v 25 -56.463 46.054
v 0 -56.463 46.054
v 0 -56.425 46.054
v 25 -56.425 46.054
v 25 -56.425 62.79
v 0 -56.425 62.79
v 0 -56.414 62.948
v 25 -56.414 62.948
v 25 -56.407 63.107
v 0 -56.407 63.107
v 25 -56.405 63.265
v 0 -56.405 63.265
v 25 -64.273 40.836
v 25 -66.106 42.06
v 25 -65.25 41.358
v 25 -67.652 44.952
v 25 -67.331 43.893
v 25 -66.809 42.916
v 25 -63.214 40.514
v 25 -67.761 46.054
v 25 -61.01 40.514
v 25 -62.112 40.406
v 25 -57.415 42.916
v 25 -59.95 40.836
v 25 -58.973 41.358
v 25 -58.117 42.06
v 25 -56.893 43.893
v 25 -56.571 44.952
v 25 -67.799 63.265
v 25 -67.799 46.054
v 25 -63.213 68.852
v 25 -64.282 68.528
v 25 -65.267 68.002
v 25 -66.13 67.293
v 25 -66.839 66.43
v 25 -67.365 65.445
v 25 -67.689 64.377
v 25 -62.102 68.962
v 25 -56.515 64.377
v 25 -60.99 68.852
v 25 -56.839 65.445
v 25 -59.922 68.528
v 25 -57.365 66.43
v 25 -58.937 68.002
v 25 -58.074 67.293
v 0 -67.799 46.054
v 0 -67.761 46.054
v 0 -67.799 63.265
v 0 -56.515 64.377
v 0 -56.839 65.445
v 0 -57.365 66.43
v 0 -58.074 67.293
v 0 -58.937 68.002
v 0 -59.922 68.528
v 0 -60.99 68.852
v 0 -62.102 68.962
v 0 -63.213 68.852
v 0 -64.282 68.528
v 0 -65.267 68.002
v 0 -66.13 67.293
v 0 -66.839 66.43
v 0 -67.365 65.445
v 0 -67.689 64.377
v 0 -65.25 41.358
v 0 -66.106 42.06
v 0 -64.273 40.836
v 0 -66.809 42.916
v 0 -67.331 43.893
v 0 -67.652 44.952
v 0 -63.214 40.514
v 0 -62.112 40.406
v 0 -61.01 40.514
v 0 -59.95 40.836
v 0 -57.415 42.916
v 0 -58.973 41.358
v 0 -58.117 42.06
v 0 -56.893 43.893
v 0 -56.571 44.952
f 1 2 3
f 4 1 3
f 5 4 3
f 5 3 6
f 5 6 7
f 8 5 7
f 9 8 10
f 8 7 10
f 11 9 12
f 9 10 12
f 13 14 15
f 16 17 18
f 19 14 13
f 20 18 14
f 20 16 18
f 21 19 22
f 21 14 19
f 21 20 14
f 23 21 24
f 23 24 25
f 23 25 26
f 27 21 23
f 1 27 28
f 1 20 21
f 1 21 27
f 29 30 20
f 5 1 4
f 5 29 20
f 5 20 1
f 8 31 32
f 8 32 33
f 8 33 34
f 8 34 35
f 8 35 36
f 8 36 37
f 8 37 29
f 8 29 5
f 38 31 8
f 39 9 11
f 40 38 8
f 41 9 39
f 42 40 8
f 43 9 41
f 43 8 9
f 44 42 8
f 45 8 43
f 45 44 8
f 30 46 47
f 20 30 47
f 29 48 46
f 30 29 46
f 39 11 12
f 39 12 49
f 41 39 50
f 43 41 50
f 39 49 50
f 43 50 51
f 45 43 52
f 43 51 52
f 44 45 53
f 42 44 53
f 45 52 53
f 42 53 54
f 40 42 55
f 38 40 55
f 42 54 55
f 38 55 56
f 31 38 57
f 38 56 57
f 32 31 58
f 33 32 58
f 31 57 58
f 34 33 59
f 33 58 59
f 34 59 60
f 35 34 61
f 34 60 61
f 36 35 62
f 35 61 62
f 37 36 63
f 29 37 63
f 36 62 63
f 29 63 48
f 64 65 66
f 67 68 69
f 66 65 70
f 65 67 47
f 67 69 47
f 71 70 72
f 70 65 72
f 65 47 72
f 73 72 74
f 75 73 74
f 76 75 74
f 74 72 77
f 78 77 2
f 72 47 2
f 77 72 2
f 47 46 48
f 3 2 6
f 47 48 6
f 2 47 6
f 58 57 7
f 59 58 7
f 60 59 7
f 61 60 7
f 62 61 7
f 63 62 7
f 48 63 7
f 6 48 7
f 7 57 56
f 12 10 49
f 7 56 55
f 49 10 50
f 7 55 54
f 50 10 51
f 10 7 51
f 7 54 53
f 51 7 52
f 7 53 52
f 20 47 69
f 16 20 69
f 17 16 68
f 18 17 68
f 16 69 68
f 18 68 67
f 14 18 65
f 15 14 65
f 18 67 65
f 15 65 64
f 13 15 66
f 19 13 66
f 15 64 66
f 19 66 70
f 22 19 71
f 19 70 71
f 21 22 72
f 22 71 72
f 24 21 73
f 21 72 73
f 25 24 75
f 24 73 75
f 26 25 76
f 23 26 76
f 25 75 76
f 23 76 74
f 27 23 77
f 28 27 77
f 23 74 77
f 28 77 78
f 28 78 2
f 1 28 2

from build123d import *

# Parameters (mm, degrees)
F3_DEPTH = 25


# Not quite as in the source:
# - the program builds the solid bodies; features that only make, move or delete a surface that nothing else refers to are left out


with BuildPart() as f3:
    # F2 (on Right) → F3 (new body)
    with BuildSketch(Plane.YZ):
        with BuildLine():
            ThreePointArc((-56.4248897135, 62.7899920644), (-56.4100056303, 63.0273500708), (-56.4050413852, 63.2651224732))
            ThreePointArc((-56.4050413852, 63.2651224732), (-62.1018148959, 68.9618959839), (-67.7985884065, 63.2651224732))
            Line((-67.7985884065, 63.2651224732), (-56.4248897135, 63.2651224732))
            Line((-56.4248897135, 63.2651224732), (-56.4248897135, 62.7899920644))
        make_face()
        with BuildLine():
            Line((-56.4628131563, 46.0544750094), (-67.7606649638, 46.0544750094))
            ThreePointArc((-67.7606649638, 46.0544750094), (-62.11173906, 40.4055491057), (-56.4628131563, 46.0544750094))
        make_face()
        with BuildLine():
            Line((-56.4248897135, 63.2651224732), (-67.7985884065, 63.2651224732))
            ThreePointArc((-67.7985884065, 63.2651224732), (-62.3395872983, 57.5733132076), (-56.4248897135, 62.7899920644))
            Line((-56.4248897135, 62.7899920644), (-56.4248897135, 63.2651224732))
        make_face()
        with BuildLine():
            ThreePointArc((-56.4248897135, 62.7899920644), (-62.3395872983, 57.5733132076), (-67.7985884065, 63.2651224732))
            Line((-67.7985884065, 63.2651224732), (-67.7985884065, 46.0544750094))
            Line((-67.7985884065, 46.0544750094), (-67.7606649638, 46.0544750094))
            ThreePointArc((-67.7606649638, 46.0544750094), (-62.11173906, 51.7034009132), (-56.4628131563, 46.0544750094))
            Line((-56.4628131563, 46.0544750094), (-56.4248897135, 46.0544750094))
            Line((-56.4248897135, 46.0544750094), (-56.4248897135, 62.7899920644))
        make_face()
        with BuildLine():
            ThreePointArc((-56.4628131563, 46.0544750094), (-62.11173906, 51.7034009132), (-67.7606649638, 46.0544750094))
            Line((-67.7606649638, 46.0544750094), (-56.4628131563, 46.0544750094))
        make_face()
    extrude(amount=F3_DEPTH)


solid = f3.part
